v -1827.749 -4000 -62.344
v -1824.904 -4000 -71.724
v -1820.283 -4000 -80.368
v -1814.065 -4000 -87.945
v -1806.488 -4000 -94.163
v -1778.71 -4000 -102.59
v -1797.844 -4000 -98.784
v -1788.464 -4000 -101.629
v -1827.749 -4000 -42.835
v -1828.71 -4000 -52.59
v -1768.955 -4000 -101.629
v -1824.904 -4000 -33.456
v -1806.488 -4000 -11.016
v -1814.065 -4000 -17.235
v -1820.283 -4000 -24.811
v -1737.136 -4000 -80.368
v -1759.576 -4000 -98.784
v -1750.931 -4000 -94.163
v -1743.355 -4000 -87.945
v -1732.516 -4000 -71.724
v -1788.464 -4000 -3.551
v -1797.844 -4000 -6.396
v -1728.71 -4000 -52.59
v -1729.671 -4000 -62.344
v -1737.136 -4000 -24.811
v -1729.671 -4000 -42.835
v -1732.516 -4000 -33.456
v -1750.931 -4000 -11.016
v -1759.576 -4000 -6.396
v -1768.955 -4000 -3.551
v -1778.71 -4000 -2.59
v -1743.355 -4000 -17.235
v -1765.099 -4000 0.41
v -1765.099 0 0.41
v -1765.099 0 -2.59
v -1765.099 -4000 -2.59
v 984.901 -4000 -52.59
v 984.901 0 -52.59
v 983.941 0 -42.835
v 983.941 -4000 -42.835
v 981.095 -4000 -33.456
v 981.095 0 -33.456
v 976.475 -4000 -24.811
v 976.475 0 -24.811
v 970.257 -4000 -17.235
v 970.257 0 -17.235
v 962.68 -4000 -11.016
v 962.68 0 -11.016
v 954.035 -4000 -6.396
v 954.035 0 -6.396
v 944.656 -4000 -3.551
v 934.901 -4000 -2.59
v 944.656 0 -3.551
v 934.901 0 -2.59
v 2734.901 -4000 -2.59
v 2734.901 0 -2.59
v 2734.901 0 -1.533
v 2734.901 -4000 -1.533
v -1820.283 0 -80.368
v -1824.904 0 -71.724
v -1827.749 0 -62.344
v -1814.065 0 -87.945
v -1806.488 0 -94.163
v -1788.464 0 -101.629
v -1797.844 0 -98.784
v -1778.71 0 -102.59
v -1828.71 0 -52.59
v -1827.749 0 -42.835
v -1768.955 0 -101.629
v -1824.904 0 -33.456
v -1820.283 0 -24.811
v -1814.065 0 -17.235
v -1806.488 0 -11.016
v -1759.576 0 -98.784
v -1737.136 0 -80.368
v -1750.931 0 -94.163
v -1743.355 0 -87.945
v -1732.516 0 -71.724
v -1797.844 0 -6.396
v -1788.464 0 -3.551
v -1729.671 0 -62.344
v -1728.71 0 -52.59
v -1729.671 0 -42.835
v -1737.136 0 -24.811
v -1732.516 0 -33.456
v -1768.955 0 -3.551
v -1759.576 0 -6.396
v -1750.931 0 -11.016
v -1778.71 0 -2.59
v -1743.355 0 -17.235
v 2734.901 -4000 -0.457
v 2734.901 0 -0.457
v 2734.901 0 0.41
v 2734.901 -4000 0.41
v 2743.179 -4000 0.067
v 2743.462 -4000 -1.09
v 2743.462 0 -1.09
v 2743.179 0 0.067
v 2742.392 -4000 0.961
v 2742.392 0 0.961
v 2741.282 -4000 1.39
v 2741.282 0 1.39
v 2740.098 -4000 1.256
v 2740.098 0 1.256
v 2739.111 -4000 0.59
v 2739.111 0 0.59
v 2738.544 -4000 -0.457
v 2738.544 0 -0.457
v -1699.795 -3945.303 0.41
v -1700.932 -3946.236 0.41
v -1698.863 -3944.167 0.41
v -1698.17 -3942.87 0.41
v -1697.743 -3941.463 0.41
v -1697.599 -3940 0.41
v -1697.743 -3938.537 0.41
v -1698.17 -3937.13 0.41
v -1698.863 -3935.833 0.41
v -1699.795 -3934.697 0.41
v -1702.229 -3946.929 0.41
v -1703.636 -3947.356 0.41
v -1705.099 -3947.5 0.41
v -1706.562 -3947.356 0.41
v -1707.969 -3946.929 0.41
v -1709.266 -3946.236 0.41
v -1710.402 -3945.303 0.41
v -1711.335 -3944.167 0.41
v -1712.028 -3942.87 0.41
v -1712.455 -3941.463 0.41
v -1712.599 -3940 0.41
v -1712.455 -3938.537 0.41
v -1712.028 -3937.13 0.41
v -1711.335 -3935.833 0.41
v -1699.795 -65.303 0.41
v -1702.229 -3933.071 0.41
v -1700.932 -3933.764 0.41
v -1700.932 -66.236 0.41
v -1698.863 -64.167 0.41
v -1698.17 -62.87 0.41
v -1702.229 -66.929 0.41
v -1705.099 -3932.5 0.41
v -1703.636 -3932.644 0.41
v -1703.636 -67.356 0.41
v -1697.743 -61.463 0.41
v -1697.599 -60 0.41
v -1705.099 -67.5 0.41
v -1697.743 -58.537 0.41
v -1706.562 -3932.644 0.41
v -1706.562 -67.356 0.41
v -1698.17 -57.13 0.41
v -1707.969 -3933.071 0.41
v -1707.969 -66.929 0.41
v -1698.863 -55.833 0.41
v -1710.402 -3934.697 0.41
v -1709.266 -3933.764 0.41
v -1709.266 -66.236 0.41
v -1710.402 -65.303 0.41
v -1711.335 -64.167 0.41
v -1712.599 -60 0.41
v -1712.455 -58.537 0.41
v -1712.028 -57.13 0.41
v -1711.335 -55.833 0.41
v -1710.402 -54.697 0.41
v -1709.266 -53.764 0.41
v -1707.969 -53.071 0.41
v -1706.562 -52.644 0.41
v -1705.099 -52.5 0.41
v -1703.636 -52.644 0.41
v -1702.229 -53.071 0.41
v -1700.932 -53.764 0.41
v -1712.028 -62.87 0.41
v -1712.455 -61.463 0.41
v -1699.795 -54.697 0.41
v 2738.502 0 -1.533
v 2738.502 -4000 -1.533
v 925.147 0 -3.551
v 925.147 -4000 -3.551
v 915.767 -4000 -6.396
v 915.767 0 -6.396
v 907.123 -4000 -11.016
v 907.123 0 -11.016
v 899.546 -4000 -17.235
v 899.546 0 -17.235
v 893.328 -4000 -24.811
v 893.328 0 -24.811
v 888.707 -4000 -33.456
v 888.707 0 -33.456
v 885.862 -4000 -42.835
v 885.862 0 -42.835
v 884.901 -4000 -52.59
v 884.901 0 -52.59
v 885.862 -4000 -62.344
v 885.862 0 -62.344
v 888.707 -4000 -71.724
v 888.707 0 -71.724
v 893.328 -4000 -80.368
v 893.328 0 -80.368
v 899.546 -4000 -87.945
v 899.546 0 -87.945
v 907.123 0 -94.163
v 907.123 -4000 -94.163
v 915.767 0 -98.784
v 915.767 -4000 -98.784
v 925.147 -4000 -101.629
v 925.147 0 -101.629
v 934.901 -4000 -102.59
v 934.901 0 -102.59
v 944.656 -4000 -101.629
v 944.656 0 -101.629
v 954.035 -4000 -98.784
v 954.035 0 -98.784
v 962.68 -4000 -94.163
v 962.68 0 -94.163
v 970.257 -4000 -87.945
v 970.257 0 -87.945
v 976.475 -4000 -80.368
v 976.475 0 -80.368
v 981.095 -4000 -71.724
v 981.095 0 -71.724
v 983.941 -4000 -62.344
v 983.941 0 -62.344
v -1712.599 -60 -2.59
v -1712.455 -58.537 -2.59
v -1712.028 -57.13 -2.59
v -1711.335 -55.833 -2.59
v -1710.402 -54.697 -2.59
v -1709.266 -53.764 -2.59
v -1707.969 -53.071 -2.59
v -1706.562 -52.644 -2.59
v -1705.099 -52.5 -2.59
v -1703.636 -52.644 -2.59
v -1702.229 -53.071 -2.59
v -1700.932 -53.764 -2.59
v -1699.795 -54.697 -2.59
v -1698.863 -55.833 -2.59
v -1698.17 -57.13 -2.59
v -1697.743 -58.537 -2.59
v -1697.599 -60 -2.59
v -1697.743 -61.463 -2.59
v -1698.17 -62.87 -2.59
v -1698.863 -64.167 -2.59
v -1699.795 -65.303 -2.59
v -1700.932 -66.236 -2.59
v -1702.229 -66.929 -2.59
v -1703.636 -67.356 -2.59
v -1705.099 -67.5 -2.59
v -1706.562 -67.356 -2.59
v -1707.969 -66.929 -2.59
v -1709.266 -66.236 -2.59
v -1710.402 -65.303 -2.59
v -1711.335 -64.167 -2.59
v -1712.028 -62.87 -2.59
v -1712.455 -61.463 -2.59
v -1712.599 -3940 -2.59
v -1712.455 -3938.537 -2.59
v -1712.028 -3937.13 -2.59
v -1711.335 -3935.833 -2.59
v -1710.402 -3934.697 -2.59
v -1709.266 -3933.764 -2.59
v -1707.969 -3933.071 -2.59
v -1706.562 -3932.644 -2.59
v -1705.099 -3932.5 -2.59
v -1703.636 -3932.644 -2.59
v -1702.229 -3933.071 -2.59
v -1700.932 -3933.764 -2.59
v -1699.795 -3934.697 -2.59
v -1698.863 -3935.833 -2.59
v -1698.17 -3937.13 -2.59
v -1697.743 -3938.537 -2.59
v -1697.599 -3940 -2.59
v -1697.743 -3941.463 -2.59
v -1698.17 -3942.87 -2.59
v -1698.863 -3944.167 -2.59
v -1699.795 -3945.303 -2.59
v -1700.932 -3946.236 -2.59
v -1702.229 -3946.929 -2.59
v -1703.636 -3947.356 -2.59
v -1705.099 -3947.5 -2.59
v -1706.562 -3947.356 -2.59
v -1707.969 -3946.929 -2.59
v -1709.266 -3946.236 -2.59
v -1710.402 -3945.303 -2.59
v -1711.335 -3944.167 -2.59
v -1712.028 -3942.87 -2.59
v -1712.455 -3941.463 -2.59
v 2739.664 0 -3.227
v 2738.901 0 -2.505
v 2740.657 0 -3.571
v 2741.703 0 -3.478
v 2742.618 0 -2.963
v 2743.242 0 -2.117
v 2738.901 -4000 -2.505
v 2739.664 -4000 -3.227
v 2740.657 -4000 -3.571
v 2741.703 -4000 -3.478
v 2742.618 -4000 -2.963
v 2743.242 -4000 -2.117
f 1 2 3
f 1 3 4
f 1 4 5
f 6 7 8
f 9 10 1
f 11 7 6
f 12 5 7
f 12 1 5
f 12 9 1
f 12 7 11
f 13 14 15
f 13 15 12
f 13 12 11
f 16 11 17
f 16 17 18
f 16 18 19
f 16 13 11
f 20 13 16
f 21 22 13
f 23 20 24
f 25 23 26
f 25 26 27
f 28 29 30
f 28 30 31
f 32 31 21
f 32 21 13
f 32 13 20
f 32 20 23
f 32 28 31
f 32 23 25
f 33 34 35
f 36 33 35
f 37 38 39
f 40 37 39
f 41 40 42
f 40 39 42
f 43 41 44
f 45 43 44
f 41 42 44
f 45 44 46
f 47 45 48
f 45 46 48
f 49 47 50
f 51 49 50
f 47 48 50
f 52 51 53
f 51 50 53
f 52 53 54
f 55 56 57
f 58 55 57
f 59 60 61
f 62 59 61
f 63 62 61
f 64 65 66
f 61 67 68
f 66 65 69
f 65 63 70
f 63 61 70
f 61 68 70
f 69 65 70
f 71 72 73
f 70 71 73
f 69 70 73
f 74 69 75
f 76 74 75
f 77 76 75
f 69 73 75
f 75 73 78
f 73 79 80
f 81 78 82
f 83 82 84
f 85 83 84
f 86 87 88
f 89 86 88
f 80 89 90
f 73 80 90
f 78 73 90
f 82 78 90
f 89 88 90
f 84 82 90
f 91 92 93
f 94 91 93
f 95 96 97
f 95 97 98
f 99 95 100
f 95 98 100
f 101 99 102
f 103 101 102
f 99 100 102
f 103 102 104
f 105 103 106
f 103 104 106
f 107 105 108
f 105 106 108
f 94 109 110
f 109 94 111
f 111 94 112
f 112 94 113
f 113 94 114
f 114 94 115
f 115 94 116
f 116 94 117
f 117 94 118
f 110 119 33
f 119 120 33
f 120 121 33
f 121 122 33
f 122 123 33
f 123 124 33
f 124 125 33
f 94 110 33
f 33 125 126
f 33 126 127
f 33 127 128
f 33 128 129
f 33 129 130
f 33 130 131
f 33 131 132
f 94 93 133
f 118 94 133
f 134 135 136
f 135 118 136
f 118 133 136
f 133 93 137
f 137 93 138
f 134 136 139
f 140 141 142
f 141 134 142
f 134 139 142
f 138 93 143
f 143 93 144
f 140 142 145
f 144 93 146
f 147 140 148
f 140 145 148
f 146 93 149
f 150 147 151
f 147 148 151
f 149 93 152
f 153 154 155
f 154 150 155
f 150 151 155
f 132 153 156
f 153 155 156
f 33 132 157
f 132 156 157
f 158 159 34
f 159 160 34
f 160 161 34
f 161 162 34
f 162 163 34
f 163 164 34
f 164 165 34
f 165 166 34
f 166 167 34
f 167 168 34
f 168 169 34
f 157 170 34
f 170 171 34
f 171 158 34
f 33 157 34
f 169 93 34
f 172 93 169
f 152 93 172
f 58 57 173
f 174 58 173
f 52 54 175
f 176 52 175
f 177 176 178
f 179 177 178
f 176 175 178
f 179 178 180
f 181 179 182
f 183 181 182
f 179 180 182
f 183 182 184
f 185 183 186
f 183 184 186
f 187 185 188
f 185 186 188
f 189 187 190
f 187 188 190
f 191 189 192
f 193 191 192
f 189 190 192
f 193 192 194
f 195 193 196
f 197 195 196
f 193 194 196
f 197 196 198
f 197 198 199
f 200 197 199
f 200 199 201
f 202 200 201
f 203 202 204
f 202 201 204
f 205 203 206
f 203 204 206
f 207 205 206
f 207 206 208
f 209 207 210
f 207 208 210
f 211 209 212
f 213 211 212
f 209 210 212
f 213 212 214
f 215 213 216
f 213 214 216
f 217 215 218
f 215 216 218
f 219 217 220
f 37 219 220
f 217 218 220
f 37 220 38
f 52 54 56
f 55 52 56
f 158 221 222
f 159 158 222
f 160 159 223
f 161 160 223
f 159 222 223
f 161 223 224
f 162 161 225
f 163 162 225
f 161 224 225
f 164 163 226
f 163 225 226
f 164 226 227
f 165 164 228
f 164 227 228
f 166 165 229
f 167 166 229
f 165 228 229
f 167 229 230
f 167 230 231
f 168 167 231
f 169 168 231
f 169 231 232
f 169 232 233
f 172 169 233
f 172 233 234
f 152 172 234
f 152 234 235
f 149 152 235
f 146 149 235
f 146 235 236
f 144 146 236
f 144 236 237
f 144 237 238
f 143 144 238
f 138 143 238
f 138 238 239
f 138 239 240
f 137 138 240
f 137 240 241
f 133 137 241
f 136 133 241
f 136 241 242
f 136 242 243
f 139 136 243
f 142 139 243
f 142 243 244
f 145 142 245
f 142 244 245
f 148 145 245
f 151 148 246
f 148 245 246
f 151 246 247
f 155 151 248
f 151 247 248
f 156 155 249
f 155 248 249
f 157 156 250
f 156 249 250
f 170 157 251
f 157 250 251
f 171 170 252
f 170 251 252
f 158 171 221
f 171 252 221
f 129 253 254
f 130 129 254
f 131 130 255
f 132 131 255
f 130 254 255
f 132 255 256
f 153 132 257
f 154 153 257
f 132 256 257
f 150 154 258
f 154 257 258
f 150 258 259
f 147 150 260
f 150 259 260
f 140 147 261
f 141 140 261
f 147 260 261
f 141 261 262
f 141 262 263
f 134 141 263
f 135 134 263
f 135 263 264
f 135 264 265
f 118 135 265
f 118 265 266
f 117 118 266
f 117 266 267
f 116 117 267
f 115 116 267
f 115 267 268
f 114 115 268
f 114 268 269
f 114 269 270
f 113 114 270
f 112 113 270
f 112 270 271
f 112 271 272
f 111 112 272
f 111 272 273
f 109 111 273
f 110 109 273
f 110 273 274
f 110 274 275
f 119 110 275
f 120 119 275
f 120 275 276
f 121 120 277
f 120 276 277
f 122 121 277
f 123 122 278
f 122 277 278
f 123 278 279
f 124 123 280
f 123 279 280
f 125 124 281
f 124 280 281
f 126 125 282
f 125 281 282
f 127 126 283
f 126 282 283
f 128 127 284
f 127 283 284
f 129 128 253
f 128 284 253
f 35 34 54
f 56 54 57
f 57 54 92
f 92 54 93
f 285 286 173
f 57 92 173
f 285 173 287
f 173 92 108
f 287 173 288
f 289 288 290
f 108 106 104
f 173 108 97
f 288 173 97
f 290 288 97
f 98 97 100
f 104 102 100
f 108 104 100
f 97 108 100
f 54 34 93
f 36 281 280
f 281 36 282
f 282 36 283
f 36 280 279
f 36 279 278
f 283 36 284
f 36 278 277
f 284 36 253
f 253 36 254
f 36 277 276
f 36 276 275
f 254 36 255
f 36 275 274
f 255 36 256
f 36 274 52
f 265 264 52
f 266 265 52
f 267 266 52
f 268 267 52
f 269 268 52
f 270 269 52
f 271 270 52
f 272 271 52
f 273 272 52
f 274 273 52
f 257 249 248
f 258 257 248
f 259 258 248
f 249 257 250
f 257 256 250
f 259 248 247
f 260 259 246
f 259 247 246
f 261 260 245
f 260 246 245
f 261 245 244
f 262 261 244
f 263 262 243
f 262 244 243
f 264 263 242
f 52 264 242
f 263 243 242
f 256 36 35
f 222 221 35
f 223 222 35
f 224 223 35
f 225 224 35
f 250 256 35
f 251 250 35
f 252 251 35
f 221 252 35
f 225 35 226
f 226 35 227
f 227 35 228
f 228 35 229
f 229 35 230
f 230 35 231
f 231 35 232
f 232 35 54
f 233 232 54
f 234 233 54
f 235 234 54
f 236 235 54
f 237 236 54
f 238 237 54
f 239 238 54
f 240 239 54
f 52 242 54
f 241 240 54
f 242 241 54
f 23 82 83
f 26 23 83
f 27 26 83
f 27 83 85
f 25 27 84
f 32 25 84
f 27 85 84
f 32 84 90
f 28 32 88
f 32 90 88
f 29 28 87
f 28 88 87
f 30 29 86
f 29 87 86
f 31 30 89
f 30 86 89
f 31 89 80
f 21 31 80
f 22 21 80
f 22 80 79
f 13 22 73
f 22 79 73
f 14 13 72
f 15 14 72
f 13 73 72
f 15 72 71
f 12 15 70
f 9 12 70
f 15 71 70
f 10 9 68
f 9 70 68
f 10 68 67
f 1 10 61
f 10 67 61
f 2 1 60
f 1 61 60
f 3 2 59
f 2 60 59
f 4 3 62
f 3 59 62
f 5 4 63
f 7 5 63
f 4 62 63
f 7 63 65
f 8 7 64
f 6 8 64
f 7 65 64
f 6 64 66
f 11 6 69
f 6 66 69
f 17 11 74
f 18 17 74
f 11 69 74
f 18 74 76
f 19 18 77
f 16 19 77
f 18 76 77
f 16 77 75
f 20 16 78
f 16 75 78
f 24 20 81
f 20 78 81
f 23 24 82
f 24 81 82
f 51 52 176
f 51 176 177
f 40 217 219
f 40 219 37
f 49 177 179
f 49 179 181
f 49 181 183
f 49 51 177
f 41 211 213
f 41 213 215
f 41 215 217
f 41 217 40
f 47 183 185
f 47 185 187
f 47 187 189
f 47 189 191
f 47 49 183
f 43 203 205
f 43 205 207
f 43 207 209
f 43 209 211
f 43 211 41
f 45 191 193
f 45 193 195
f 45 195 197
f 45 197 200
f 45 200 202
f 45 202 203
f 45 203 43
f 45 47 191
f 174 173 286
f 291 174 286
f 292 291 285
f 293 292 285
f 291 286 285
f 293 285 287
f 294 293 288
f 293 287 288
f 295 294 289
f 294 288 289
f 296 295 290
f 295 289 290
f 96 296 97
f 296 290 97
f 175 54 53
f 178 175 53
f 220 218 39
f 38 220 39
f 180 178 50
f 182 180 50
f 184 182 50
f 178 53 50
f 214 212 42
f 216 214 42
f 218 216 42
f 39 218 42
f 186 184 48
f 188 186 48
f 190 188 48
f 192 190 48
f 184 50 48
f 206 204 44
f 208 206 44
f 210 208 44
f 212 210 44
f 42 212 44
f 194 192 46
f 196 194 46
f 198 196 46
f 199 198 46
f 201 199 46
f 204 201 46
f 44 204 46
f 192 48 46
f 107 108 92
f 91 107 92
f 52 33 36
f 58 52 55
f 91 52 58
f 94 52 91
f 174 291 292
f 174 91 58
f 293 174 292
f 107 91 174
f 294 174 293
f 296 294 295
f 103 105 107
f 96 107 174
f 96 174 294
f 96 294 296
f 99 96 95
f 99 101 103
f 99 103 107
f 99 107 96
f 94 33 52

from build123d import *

# Parameters (mm, degrees)
F0_R     = 50
F1_DEPTH = 4000
F3_D     = 15
F5_D     = 15


with BuildPart() as f1:
    # F0 (on Front) → F1 (new body)
    with BuildSketch(Plane.XZ):
        Polygon((-1765.098724, 0.410088), (-1765.098724, -2.589912), (934.901275, -2.589912), (2734.901276, -2.589912), (2734.901276, -1.533305), (2734.901276, -0.456593), (2734.901276, 0.410088), align=None)
        with BuildLine():
            ThreePointArc((984.901276, -52.589912), (970.256615, -17.234573), (934.901275, -2.589912))
            ThreePointArc((934.901275, -2.589912), (899.545938, -87.945251), (984.901276, -52.589912))
        make_face()
        with BuildLine():
            Line((2734.901276, -0.456593), (2734.901276, -1.533305))
            Line((2734.901276, -1.533305), (2738.501901, -1.533305))
            ThreePointArc((2738.501901, -1.533305), (2738.464159, -0.992664), (2738.543816, -0.456593))
            Line((2738.543816, -0.456593), (2734.901276, -0.456593))
        make_face()
        with BuildLine():
            ThreePointArc((2738.543816, -0.456593), (2738.464159, -0.992664), (2738.501901, -1.533305))
            ThreePointArc((2738.501901, -1.533305), (2741.184848, -3.579984), (2743.462267, -1.089912))
            ThreePointArc((2743.462267, -1.089912), (2741.281541, 1.389617), (2738.543816, -0.456593))
        make_face()
        with Locations((-1778.709888, -52.589912)):
            Circle(F0_R)
    extrude(amount=F1_DEPTH)

    # F3 (through all)
    with Locations(Plane.XY.offset(0.410088)):
        with Locations((-1705.098724, -60)):
            Hole(F3_D / 2)

    # F5 (through all)
    with Locations(Plane.XY.offset(0.410088)):
        with Locations((-1705.098724, -3940)):
            Hole(F5_D / 2)


solid = f1.part
